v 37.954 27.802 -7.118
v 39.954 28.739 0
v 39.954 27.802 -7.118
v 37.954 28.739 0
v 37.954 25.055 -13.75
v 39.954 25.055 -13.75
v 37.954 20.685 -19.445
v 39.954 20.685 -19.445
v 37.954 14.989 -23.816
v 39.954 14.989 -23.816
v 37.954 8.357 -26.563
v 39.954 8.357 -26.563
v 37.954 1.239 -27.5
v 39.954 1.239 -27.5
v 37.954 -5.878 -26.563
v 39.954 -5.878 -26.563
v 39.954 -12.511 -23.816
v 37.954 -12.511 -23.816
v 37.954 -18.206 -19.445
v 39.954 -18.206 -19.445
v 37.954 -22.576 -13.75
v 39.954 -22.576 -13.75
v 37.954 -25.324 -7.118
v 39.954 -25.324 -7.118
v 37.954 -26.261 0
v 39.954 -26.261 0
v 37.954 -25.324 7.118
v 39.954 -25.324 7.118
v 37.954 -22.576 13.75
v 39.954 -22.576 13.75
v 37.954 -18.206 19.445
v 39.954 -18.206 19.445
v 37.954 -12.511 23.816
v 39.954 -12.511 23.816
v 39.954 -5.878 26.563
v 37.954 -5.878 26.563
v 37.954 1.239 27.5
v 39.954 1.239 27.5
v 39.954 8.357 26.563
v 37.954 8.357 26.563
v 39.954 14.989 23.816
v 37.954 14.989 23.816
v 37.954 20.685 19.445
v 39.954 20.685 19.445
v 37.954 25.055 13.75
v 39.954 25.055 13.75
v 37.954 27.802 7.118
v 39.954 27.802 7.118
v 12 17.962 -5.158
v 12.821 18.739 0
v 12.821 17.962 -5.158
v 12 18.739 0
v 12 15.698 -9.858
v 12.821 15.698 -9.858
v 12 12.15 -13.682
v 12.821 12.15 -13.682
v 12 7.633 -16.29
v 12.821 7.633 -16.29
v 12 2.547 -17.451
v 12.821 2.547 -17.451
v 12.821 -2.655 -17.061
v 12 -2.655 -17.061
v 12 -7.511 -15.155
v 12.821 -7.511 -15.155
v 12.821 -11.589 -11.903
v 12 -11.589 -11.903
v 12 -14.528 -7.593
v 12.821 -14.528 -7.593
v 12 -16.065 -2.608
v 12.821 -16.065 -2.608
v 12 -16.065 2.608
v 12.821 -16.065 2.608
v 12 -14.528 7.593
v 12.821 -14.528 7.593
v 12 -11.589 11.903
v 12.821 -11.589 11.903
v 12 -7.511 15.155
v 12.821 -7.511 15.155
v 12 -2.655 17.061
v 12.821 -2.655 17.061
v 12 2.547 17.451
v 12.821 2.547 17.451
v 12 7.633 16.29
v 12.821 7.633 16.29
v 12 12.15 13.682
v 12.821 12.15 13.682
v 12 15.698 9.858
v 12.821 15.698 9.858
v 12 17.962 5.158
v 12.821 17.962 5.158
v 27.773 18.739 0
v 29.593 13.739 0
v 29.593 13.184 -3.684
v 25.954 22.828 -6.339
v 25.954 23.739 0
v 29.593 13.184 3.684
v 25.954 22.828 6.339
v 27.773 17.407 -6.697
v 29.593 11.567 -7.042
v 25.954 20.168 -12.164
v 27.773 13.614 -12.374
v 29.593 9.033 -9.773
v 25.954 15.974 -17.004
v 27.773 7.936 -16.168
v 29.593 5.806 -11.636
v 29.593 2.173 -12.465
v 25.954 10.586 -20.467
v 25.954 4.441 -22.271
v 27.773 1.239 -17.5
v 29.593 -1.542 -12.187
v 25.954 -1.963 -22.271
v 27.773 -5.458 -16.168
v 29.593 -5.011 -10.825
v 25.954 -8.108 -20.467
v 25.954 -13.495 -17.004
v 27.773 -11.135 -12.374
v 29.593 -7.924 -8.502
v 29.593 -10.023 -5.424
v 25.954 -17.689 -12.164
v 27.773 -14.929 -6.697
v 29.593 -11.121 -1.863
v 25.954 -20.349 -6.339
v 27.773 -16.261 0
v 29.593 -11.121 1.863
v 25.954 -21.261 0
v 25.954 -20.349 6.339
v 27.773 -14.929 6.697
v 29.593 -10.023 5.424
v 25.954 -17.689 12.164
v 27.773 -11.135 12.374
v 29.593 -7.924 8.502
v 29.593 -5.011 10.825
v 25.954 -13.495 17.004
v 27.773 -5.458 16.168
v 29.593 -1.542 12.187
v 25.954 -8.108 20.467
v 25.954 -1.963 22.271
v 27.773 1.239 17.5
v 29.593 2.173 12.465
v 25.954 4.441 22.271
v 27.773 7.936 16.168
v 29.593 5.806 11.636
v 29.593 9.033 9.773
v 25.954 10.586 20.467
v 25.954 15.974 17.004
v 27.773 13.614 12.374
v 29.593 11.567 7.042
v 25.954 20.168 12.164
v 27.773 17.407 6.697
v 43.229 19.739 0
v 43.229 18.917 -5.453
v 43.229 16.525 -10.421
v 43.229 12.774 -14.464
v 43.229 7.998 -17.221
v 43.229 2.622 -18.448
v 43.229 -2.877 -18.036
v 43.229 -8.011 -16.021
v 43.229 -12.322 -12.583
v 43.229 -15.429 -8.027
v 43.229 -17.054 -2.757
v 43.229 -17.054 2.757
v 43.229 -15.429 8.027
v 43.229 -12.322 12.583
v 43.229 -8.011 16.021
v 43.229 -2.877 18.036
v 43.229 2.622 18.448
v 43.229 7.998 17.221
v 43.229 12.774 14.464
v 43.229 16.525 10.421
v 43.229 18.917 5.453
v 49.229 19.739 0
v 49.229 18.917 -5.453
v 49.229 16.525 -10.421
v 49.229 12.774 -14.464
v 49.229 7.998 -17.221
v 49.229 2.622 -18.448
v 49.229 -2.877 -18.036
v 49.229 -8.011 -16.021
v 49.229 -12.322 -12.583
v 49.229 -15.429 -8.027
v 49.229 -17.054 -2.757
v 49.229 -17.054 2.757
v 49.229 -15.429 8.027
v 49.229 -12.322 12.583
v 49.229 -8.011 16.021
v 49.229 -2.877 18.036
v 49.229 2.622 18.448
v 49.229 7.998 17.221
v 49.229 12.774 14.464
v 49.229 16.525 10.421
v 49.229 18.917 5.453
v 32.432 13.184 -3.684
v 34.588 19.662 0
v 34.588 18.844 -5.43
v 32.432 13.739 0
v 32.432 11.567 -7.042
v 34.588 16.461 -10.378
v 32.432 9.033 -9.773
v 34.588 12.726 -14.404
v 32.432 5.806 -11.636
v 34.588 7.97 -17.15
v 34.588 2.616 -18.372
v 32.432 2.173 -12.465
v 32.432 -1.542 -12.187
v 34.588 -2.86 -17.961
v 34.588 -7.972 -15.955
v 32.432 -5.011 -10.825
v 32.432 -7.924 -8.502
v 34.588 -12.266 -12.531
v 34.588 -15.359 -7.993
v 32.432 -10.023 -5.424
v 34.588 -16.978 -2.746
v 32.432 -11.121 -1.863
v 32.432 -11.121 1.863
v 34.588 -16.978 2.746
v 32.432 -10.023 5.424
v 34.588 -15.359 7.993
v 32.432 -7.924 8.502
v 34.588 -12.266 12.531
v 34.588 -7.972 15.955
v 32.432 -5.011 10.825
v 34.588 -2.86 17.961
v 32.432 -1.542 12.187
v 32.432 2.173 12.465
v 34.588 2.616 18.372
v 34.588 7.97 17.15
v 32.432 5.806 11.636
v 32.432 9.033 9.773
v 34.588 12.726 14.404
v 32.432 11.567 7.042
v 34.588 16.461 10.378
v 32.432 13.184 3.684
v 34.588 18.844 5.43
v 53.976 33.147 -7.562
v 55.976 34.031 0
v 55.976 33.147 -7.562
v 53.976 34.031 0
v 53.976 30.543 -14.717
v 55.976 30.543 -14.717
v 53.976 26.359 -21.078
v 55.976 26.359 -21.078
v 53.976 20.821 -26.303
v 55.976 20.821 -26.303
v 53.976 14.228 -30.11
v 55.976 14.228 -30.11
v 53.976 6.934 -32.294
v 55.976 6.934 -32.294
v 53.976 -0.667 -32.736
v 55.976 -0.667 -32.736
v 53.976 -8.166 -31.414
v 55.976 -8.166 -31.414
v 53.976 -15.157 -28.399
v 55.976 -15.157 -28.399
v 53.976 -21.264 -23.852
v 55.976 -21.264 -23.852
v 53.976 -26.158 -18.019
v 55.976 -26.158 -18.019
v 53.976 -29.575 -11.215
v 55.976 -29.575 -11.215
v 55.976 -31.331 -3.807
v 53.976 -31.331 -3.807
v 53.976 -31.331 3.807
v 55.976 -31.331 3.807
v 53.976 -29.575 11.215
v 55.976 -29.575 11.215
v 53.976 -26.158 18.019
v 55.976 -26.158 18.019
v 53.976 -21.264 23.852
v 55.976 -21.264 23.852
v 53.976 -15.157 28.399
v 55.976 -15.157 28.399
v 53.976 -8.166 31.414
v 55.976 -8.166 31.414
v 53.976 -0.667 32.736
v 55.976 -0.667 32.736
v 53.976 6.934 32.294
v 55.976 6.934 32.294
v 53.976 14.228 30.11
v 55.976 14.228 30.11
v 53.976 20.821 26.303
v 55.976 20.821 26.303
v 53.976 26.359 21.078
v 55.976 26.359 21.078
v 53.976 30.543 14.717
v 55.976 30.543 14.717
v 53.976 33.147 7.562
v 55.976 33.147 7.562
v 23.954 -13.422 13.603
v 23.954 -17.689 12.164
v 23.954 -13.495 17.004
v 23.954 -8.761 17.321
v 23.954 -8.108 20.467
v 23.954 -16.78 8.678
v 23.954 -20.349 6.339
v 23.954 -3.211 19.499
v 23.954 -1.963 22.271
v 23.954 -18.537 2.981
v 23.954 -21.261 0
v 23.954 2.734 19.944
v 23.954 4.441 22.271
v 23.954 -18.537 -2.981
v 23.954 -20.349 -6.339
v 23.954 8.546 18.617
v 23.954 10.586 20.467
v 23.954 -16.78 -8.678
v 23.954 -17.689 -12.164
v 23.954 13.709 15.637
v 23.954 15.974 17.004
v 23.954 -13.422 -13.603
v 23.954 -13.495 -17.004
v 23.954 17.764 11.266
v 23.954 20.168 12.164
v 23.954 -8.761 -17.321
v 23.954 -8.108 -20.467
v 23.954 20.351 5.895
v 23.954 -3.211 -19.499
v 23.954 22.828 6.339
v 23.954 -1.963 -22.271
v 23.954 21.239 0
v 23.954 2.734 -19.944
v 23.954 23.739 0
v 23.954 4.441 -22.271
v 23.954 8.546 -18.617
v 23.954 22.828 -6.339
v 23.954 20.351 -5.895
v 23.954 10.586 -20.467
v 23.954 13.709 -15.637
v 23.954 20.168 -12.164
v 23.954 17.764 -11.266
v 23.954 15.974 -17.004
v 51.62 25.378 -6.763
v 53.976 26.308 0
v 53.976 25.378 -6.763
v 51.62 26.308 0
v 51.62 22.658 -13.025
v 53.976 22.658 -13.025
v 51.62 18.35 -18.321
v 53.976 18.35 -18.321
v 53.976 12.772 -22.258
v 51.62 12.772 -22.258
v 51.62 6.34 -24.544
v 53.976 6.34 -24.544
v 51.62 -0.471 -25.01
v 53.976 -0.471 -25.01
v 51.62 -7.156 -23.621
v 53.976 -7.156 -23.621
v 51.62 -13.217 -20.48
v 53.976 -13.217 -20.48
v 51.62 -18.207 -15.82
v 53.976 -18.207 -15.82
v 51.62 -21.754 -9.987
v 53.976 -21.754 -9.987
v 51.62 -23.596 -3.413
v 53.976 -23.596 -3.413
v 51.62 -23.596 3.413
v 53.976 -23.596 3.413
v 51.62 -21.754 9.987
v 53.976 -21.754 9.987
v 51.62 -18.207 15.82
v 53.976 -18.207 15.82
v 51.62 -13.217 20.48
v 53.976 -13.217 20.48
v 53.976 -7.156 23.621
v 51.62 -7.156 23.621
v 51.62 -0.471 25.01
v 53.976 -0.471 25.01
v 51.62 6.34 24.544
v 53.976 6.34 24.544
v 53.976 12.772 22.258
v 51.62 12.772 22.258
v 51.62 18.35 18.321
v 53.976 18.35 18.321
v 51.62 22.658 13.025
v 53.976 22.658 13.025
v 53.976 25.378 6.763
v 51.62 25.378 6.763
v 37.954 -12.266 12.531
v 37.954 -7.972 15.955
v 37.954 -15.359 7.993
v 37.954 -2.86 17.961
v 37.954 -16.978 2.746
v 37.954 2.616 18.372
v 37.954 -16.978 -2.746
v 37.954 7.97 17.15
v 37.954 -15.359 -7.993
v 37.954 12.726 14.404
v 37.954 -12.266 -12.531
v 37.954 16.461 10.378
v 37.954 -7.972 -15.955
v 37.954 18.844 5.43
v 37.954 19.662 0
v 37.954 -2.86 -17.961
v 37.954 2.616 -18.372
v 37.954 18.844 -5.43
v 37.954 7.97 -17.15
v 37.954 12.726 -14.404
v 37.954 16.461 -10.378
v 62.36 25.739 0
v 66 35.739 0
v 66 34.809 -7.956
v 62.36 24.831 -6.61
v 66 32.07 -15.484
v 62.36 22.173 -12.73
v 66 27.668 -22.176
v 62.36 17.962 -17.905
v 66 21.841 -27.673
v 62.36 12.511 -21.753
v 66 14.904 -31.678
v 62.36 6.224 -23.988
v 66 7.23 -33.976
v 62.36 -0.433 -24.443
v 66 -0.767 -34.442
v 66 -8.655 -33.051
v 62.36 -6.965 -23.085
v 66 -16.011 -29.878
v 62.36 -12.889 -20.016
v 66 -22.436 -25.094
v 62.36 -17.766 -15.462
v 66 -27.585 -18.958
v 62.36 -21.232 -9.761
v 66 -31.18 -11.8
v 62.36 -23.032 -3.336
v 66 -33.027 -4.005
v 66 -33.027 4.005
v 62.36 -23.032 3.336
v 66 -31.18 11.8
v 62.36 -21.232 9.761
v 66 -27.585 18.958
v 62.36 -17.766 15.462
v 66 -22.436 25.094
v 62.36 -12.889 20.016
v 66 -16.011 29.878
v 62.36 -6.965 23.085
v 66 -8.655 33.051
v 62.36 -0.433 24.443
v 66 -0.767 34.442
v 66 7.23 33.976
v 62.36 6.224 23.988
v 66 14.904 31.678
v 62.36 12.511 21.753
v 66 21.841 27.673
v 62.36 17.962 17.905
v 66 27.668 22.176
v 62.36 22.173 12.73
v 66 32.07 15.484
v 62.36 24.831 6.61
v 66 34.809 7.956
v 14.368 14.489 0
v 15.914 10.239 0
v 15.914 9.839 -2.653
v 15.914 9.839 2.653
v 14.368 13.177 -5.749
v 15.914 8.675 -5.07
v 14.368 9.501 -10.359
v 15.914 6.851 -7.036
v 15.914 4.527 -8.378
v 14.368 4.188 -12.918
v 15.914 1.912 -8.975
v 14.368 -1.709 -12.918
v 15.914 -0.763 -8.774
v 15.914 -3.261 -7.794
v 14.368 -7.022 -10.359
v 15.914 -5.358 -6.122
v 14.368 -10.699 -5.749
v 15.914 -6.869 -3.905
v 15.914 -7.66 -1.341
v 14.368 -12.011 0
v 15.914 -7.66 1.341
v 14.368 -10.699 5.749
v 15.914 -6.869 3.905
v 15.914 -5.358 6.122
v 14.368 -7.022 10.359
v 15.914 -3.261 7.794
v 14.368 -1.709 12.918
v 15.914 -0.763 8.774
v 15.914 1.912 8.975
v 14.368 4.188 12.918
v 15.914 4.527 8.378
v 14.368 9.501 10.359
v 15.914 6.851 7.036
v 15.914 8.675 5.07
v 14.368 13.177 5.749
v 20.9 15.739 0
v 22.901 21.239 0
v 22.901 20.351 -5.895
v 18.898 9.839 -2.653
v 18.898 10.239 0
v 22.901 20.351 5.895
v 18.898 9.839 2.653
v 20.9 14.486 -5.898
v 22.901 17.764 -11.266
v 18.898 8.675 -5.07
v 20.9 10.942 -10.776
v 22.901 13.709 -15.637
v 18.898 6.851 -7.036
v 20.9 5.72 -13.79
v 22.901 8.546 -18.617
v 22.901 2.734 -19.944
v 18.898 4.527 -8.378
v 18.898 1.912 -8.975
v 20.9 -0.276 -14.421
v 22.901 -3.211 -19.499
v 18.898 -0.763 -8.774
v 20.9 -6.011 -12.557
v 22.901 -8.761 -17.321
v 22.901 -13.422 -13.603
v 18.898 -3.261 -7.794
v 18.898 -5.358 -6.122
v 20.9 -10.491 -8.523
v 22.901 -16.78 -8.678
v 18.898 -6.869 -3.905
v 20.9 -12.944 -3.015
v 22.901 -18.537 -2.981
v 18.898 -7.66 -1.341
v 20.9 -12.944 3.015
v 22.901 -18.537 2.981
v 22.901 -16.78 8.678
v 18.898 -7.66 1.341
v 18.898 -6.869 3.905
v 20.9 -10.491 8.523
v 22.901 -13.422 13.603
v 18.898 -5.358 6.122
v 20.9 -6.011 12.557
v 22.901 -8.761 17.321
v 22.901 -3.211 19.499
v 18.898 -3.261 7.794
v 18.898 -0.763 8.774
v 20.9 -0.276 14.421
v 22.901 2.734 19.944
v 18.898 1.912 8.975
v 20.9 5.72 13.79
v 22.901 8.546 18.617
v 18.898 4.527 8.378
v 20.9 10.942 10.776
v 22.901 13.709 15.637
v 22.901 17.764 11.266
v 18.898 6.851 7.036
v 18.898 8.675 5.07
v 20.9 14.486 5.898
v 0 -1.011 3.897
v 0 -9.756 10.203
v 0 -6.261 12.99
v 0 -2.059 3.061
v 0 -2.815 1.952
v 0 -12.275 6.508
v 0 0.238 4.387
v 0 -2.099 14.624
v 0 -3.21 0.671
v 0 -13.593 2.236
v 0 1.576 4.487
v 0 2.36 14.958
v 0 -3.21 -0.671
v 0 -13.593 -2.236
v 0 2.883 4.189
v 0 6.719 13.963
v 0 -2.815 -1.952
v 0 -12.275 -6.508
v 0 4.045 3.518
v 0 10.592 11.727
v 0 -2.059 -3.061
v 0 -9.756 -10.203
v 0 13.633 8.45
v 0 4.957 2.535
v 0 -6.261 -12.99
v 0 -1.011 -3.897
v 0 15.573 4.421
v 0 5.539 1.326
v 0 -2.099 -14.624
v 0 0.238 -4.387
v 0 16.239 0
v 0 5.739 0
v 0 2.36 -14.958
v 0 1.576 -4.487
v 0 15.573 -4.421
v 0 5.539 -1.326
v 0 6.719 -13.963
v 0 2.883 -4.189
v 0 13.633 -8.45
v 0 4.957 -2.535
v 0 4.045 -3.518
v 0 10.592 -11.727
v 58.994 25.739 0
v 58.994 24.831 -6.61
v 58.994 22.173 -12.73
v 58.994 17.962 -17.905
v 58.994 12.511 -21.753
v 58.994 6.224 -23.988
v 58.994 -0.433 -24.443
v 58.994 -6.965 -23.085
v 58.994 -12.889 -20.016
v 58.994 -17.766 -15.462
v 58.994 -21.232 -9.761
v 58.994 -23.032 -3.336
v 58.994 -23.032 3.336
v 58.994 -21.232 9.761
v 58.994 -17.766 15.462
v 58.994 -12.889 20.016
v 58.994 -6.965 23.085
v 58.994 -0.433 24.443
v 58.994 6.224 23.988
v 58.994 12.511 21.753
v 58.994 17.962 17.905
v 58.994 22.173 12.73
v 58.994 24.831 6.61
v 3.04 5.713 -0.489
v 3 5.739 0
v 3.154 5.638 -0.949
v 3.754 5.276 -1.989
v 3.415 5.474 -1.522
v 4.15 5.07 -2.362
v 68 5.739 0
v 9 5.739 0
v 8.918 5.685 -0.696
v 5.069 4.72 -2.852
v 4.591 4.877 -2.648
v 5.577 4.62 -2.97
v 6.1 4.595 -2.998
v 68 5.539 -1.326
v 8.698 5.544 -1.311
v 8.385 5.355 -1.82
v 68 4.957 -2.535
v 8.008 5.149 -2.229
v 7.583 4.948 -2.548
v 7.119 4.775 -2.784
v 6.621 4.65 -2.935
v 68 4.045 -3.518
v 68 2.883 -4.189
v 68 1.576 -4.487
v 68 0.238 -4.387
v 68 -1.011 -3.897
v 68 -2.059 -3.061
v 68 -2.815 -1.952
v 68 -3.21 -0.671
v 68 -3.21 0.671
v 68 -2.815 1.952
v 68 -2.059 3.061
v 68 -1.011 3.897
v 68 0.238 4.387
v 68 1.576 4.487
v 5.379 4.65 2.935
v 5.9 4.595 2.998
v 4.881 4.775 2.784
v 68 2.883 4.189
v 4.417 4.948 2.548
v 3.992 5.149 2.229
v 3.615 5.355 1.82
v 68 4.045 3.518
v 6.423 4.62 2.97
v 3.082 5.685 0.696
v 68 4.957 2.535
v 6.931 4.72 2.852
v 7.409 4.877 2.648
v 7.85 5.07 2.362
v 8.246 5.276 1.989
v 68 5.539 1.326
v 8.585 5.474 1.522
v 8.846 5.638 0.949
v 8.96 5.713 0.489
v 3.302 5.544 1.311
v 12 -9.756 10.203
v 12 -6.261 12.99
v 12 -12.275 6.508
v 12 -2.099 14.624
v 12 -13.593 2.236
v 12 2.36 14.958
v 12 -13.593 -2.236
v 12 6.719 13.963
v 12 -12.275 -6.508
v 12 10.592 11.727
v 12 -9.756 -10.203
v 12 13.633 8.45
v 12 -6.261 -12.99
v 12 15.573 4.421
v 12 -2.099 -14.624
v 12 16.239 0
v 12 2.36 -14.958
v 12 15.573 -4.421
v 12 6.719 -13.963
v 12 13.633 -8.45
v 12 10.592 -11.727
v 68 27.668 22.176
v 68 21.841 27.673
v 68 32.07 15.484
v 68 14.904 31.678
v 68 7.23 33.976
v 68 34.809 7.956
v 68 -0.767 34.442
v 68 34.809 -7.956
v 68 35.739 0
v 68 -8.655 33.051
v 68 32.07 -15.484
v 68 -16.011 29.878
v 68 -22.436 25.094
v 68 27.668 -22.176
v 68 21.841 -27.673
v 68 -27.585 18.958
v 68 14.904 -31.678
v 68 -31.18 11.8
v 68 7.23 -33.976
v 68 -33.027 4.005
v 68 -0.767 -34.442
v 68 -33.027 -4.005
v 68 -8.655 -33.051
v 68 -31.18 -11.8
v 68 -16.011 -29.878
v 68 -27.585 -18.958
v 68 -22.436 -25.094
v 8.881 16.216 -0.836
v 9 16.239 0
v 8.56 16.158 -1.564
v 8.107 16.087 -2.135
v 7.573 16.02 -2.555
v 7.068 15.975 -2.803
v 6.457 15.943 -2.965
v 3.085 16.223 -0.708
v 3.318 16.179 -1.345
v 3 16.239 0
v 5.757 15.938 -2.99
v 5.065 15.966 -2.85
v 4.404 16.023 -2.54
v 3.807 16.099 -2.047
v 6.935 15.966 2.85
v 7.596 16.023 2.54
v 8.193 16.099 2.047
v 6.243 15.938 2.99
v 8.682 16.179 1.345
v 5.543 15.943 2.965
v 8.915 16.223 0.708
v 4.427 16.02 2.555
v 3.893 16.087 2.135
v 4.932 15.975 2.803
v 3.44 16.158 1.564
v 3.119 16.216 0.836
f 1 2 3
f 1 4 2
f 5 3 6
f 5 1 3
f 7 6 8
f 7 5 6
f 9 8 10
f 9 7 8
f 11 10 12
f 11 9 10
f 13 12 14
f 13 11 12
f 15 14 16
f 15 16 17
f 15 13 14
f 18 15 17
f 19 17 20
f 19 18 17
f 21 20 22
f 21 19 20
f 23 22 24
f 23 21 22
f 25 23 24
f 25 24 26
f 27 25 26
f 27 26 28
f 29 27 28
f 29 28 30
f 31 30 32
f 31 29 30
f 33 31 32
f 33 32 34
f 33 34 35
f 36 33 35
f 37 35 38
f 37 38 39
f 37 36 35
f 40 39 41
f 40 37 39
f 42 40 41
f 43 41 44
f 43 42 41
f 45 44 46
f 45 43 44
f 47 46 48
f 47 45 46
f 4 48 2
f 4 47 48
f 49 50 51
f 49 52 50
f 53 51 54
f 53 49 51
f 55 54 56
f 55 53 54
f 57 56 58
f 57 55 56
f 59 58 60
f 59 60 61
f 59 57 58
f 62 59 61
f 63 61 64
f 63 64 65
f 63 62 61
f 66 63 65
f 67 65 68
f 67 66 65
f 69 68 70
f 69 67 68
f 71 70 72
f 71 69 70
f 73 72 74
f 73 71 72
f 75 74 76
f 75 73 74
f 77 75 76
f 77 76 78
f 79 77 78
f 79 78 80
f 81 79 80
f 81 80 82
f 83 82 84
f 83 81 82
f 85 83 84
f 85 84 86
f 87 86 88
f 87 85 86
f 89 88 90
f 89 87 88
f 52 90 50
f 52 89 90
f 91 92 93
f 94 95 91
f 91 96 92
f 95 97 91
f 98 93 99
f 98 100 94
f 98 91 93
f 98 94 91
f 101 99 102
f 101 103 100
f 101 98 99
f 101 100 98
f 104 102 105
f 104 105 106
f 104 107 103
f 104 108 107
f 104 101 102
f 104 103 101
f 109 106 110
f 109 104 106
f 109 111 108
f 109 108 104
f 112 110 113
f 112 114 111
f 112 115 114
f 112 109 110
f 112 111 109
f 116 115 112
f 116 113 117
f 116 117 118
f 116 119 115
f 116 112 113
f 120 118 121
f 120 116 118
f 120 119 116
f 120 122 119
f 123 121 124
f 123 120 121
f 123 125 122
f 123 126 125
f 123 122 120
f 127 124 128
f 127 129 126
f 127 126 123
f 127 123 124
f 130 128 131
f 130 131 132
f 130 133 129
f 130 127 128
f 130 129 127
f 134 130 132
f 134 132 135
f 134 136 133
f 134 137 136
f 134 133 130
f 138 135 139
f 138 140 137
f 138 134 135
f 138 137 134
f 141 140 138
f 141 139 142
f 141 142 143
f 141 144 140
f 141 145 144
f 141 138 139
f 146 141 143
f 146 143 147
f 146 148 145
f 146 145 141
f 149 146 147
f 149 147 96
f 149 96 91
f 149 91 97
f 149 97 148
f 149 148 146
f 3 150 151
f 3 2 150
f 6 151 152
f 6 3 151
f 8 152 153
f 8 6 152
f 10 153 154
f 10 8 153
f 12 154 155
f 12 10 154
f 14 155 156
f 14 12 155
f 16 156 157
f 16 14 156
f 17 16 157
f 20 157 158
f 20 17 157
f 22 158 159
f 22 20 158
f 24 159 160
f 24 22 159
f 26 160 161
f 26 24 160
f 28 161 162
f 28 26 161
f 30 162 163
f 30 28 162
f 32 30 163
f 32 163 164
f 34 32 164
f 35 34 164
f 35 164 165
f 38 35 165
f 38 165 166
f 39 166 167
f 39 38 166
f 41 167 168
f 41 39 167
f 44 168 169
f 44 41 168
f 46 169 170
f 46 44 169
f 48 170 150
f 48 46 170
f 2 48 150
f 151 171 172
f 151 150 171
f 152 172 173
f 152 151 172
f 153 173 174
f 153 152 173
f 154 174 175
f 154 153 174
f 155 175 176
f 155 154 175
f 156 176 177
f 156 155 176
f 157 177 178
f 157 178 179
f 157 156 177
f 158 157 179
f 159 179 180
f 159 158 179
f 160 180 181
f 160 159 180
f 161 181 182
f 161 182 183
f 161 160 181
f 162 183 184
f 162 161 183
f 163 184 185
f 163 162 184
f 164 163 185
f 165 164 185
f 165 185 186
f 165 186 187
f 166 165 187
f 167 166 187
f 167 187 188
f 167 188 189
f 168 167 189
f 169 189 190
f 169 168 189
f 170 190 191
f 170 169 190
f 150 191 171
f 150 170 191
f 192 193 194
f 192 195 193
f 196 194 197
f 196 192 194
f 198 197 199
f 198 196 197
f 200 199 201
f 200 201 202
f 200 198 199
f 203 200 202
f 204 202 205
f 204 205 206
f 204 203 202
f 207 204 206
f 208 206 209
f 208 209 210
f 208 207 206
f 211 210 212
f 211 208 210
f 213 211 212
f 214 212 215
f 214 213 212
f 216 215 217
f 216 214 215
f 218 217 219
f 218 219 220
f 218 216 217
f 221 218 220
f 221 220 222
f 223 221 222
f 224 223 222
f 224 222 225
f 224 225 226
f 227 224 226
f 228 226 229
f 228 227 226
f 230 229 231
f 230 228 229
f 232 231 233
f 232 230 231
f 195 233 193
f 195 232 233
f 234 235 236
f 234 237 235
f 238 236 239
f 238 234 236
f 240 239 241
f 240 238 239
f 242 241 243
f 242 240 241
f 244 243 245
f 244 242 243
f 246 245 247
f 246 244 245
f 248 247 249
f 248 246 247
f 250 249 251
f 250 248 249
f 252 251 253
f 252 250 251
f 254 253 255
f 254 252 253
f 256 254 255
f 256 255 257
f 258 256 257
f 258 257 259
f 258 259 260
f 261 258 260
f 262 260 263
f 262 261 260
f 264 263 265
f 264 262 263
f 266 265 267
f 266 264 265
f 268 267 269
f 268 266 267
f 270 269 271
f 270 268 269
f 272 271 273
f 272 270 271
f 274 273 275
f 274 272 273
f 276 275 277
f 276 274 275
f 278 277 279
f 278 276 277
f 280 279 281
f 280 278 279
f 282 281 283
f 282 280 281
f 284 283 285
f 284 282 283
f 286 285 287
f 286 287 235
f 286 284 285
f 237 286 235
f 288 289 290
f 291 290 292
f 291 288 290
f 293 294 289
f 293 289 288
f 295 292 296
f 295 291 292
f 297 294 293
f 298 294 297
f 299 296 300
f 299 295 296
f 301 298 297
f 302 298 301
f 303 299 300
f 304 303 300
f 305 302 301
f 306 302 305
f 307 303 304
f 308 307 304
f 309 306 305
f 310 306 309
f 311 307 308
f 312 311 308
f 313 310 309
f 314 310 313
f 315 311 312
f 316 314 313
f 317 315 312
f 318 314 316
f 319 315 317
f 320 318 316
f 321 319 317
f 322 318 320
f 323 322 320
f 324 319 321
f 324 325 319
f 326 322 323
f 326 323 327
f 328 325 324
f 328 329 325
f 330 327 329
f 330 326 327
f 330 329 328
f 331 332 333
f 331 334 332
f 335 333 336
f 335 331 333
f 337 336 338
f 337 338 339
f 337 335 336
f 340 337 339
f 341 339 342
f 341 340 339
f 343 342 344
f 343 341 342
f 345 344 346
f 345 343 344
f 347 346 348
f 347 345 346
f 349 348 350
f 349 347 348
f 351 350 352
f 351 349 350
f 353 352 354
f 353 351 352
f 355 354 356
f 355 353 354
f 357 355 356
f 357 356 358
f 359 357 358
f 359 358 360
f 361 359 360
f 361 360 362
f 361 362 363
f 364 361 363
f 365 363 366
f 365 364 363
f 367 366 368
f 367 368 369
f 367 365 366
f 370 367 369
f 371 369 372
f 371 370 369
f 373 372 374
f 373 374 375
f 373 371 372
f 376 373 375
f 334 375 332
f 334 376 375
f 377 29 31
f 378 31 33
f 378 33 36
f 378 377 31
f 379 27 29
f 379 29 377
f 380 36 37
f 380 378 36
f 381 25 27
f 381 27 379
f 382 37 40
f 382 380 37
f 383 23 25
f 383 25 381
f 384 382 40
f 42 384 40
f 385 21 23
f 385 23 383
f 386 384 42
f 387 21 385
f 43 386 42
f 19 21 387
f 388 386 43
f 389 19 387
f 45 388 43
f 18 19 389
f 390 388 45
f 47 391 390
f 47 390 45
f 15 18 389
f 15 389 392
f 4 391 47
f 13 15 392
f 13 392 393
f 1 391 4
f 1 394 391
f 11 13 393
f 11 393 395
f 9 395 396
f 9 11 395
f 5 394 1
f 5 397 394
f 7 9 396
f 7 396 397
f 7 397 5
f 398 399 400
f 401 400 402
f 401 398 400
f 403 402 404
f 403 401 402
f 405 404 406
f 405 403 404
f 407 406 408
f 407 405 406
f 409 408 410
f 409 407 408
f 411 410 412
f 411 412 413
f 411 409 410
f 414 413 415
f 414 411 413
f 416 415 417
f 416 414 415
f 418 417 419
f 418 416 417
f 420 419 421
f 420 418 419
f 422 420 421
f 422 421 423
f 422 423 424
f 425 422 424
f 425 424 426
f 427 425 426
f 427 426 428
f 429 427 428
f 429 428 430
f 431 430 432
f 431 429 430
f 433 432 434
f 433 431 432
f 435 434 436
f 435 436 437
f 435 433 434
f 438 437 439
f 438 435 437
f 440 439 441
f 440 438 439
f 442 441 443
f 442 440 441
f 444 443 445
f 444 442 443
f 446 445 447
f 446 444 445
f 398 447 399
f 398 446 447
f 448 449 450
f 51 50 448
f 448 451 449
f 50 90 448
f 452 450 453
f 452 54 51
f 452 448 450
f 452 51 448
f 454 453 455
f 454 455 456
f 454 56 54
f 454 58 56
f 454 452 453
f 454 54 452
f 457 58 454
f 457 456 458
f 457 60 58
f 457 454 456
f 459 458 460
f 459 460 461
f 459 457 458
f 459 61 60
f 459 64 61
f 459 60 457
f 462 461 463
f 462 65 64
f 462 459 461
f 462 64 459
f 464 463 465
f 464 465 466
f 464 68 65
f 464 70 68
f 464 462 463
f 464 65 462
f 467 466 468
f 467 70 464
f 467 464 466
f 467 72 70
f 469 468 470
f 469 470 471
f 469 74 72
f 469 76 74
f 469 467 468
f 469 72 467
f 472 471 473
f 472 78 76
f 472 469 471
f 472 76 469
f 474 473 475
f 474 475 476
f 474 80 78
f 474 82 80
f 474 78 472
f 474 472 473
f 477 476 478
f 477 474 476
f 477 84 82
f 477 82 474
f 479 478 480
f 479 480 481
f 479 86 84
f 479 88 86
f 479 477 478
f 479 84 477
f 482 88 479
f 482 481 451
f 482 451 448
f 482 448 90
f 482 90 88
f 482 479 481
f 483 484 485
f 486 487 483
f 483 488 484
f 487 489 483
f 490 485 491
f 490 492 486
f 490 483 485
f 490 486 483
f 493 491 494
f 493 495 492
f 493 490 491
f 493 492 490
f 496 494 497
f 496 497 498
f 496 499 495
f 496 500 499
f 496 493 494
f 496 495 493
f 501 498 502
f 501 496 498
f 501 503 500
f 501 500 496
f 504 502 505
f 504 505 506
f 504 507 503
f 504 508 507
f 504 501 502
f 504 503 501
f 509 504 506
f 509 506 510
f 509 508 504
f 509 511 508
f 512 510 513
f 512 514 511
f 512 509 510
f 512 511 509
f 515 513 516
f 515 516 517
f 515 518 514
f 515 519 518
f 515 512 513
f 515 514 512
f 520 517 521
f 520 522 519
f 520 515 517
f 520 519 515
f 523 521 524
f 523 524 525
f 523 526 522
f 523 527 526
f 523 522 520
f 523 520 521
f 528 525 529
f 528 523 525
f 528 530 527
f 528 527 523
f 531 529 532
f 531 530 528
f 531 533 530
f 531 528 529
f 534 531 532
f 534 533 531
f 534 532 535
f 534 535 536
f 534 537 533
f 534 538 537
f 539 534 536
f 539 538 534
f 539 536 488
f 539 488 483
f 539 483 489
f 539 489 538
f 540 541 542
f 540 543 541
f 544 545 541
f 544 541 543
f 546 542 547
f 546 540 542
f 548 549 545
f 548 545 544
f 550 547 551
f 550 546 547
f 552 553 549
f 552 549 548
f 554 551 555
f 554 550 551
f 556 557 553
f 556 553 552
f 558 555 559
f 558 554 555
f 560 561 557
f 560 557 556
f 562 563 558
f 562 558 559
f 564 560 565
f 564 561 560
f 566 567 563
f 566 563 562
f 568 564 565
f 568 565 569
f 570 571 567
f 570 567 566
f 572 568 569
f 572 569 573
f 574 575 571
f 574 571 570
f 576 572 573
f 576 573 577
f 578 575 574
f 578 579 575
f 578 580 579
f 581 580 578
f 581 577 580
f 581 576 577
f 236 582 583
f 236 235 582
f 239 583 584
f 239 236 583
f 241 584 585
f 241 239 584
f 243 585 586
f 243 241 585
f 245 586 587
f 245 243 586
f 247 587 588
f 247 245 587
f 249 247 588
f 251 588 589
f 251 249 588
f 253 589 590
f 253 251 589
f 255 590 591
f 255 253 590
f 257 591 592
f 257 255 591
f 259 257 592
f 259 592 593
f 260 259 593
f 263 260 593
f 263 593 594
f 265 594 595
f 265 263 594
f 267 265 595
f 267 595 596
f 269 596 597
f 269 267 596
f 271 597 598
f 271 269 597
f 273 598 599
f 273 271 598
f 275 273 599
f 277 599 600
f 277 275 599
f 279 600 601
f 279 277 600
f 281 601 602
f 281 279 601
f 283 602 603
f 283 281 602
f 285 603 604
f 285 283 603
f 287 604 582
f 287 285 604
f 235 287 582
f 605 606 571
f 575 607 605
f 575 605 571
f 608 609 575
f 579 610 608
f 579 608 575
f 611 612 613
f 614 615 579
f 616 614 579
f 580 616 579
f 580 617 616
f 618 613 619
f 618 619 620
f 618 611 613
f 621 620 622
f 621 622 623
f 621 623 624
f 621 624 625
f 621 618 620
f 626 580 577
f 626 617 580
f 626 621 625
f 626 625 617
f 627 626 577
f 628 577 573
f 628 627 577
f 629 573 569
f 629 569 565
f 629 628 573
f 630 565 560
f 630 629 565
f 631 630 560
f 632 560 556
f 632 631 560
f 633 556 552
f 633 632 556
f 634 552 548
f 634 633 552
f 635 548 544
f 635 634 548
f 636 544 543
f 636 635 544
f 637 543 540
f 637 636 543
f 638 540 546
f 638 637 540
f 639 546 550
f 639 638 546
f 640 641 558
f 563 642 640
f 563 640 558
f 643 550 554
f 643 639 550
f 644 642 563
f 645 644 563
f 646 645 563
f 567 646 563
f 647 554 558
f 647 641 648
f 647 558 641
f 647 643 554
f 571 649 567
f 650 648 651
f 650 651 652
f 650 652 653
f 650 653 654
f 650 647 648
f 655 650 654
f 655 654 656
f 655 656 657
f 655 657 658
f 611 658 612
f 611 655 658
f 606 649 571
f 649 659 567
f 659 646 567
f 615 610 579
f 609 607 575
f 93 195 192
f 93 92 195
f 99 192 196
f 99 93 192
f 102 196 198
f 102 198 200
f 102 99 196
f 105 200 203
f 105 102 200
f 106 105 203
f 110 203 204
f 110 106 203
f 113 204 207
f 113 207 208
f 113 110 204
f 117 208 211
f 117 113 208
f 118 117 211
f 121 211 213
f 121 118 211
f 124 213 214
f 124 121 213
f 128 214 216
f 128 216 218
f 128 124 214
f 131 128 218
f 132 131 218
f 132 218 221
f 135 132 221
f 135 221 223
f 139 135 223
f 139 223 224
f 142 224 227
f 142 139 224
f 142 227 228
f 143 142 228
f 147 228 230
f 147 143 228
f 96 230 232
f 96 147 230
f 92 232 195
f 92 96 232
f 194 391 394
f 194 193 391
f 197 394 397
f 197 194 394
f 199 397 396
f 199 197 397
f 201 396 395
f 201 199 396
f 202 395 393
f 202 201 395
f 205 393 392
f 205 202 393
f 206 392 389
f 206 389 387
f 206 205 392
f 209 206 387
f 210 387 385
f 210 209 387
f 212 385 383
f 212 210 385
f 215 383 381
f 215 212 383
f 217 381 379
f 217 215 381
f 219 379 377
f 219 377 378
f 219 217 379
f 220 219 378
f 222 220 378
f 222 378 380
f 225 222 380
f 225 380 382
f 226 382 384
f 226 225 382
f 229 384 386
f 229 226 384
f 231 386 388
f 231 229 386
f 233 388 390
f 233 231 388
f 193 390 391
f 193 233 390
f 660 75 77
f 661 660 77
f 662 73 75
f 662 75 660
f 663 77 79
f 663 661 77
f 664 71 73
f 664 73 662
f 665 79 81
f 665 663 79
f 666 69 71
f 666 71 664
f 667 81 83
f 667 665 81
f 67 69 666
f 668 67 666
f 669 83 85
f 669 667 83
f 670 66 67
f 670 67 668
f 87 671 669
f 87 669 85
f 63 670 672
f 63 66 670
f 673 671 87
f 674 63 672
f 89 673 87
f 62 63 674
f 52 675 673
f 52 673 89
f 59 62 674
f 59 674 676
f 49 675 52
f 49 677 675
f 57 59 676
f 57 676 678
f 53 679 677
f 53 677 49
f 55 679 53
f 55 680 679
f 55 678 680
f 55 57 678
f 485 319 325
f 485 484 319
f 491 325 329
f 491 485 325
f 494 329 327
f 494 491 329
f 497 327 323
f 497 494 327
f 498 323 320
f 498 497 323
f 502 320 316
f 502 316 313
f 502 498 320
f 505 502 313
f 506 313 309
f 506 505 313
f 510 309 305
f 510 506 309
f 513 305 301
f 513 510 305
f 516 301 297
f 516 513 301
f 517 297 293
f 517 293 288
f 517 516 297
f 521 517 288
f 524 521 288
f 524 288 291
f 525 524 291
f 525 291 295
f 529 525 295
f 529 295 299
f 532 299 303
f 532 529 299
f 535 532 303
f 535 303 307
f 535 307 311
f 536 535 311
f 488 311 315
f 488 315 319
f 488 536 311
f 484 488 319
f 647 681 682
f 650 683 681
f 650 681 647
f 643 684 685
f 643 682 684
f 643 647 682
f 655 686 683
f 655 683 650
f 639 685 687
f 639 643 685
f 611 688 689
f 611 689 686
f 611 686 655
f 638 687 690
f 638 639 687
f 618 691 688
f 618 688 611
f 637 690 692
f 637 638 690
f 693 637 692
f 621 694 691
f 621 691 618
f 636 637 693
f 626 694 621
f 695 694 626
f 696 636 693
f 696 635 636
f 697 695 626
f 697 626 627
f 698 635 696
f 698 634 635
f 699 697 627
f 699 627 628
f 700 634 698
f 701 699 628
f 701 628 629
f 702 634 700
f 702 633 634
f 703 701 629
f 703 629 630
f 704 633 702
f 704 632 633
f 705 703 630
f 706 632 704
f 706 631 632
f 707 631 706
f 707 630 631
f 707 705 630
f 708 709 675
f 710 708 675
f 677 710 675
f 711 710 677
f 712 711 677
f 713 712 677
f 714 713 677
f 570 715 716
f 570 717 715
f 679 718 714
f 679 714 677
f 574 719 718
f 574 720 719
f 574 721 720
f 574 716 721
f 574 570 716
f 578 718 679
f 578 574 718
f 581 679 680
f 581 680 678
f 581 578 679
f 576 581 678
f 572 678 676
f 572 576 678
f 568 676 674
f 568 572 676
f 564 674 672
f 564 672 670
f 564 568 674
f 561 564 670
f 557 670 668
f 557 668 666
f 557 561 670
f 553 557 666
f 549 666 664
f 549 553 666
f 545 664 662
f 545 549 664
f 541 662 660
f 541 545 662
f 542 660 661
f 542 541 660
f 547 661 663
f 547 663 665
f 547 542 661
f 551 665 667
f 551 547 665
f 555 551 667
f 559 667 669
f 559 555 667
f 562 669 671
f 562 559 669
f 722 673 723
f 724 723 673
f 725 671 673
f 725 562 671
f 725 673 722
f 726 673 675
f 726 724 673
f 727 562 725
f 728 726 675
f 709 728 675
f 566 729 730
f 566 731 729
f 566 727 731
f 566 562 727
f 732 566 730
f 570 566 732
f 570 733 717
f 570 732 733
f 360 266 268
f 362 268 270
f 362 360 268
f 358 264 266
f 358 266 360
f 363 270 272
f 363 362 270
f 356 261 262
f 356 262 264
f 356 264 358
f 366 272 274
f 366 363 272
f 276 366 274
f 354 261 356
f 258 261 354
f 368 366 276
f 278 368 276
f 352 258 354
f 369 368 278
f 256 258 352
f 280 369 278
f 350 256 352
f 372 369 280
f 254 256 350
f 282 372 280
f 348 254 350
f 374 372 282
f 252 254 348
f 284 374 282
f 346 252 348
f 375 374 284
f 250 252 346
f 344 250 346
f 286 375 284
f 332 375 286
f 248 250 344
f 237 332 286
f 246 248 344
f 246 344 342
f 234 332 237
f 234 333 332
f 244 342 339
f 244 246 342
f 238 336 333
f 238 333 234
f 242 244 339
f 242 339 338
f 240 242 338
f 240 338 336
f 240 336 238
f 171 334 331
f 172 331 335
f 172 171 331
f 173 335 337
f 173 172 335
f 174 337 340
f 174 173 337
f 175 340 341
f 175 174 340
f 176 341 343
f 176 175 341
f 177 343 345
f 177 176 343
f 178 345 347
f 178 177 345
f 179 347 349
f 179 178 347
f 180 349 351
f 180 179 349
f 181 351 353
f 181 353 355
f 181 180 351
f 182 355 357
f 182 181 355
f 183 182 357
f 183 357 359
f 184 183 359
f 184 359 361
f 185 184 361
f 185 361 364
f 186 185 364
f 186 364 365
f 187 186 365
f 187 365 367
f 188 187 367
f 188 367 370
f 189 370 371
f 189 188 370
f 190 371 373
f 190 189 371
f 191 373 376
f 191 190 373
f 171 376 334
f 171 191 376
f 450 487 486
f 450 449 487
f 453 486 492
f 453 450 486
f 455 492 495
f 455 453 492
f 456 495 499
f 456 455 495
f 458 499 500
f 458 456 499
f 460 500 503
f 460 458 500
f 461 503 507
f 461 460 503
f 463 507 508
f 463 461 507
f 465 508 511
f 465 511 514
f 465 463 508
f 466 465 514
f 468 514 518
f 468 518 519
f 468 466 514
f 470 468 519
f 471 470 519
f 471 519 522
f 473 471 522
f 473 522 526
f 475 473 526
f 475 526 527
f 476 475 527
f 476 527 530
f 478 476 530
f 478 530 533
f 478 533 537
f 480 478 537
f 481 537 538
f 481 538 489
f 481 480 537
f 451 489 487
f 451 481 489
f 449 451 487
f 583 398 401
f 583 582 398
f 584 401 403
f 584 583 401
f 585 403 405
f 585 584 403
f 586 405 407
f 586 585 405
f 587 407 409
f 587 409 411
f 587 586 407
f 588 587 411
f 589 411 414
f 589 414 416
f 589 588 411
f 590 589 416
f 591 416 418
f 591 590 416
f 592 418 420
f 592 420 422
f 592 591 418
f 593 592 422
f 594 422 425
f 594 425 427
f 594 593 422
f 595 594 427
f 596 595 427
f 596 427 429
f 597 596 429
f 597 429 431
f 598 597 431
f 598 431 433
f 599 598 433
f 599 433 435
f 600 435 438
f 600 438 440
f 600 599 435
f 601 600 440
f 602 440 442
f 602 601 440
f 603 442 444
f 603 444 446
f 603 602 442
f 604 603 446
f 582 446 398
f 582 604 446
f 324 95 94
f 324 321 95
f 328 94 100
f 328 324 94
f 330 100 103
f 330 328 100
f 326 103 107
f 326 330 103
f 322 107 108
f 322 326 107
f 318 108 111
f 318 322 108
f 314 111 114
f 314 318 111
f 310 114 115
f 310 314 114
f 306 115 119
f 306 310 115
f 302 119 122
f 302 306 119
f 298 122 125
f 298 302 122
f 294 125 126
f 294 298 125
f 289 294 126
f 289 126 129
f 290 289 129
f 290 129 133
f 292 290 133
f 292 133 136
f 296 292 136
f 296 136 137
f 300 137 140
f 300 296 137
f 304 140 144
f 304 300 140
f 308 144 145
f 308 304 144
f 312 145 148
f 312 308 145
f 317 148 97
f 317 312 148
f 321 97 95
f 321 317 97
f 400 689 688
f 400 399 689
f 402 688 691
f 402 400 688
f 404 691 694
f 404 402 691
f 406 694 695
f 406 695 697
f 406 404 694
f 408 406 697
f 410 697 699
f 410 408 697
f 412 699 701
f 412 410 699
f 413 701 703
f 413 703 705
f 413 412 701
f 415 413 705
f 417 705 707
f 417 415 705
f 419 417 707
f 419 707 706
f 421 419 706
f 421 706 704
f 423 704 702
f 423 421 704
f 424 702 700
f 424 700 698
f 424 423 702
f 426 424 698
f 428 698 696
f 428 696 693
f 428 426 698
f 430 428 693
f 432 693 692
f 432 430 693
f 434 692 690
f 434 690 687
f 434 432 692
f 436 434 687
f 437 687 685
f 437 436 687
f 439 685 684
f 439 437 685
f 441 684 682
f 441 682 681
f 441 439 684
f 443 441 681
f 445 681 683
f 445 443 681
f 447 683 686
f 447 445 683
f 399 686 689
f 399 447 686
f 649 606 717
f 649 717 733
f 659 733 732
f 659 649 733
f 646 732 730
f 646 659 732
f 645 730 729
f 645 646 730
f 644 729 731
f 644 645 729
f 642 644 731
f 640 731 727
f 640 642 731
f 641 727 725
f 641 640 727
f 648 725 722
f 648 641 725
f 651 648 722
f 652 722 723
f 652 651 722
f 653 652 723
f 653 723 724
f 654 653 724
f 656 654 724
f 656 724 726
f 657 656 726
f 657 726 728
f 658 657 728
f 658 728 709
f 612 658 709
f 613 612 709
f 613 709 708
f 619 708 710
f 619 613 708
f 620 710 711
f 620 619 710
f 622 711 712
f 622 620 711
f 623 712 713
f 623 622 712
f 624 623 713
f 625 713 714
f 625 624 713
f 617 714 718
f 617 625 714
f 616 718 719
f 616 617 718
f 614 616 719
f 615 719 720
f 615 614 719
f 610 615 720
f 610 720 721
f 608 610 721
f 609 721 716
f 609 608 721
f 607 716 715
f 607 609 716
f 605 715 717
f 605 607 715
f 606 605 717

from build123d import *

# Parameters (mm, degrees)
SKETCH3_R          = 3
CUT_EXTRUDE1_DEPTH = 24


with BuildPart() as part:
    # Sketch2 → Revolve1 (revolve)
    with BuildSketch(Plane.XY):
        Polygon((0, 5.73931272), (68, 5.73931272), (68, 35.73931272), (66, 35.73931272), (62.360297657, 25.73931272), (58.993760511, 25.73931272), (55.975766288, 34.031183701), (53.975766288, 34.031183701), (53.975766288, 26.307716676), (51.619965111, 26.307716676), (49.229261585, 19.73931272), (43.229261585, 19.73931272), (39.953529476, 28.73931272), (37.953529476, 28.73931272), (37.953529476, 19.662434754), (34.588066023, 19.662434754), (32.432225909, 13.73931272), (29.593231819, 13.73931272), (25.953529476, 23.73931272), (23.953529476, 23.73931272), (23.953529476, 21.23931272), (22.901415474, 21.23931272), (18.897742897, 10.23931272), (15.914444309, 10.23931272), (12.820697317, 18.73931272), (12, 18.73931272), (12, 16.23931272), (0, 16.23931272), align=None)
    revolve(axis=Axis((0, 1.23931272, 0), (-1, 0, 0)))

    # Sketch3 → Cut-Extrude1 (cut)
    with BuildSketch(Plane(origin=(0, 0, 0), x_dir=(1, 0, 0), z_dir=(0, 1, 0))):
        with Locations(Location((6, 0, 0), (0, 0, 180))):
            Circle(SKETCH3_R)
    extrude(amount=CUT_EXTRUDE1_DEPTH, mode=Mode.SUBTRACT)


solid = part.part
